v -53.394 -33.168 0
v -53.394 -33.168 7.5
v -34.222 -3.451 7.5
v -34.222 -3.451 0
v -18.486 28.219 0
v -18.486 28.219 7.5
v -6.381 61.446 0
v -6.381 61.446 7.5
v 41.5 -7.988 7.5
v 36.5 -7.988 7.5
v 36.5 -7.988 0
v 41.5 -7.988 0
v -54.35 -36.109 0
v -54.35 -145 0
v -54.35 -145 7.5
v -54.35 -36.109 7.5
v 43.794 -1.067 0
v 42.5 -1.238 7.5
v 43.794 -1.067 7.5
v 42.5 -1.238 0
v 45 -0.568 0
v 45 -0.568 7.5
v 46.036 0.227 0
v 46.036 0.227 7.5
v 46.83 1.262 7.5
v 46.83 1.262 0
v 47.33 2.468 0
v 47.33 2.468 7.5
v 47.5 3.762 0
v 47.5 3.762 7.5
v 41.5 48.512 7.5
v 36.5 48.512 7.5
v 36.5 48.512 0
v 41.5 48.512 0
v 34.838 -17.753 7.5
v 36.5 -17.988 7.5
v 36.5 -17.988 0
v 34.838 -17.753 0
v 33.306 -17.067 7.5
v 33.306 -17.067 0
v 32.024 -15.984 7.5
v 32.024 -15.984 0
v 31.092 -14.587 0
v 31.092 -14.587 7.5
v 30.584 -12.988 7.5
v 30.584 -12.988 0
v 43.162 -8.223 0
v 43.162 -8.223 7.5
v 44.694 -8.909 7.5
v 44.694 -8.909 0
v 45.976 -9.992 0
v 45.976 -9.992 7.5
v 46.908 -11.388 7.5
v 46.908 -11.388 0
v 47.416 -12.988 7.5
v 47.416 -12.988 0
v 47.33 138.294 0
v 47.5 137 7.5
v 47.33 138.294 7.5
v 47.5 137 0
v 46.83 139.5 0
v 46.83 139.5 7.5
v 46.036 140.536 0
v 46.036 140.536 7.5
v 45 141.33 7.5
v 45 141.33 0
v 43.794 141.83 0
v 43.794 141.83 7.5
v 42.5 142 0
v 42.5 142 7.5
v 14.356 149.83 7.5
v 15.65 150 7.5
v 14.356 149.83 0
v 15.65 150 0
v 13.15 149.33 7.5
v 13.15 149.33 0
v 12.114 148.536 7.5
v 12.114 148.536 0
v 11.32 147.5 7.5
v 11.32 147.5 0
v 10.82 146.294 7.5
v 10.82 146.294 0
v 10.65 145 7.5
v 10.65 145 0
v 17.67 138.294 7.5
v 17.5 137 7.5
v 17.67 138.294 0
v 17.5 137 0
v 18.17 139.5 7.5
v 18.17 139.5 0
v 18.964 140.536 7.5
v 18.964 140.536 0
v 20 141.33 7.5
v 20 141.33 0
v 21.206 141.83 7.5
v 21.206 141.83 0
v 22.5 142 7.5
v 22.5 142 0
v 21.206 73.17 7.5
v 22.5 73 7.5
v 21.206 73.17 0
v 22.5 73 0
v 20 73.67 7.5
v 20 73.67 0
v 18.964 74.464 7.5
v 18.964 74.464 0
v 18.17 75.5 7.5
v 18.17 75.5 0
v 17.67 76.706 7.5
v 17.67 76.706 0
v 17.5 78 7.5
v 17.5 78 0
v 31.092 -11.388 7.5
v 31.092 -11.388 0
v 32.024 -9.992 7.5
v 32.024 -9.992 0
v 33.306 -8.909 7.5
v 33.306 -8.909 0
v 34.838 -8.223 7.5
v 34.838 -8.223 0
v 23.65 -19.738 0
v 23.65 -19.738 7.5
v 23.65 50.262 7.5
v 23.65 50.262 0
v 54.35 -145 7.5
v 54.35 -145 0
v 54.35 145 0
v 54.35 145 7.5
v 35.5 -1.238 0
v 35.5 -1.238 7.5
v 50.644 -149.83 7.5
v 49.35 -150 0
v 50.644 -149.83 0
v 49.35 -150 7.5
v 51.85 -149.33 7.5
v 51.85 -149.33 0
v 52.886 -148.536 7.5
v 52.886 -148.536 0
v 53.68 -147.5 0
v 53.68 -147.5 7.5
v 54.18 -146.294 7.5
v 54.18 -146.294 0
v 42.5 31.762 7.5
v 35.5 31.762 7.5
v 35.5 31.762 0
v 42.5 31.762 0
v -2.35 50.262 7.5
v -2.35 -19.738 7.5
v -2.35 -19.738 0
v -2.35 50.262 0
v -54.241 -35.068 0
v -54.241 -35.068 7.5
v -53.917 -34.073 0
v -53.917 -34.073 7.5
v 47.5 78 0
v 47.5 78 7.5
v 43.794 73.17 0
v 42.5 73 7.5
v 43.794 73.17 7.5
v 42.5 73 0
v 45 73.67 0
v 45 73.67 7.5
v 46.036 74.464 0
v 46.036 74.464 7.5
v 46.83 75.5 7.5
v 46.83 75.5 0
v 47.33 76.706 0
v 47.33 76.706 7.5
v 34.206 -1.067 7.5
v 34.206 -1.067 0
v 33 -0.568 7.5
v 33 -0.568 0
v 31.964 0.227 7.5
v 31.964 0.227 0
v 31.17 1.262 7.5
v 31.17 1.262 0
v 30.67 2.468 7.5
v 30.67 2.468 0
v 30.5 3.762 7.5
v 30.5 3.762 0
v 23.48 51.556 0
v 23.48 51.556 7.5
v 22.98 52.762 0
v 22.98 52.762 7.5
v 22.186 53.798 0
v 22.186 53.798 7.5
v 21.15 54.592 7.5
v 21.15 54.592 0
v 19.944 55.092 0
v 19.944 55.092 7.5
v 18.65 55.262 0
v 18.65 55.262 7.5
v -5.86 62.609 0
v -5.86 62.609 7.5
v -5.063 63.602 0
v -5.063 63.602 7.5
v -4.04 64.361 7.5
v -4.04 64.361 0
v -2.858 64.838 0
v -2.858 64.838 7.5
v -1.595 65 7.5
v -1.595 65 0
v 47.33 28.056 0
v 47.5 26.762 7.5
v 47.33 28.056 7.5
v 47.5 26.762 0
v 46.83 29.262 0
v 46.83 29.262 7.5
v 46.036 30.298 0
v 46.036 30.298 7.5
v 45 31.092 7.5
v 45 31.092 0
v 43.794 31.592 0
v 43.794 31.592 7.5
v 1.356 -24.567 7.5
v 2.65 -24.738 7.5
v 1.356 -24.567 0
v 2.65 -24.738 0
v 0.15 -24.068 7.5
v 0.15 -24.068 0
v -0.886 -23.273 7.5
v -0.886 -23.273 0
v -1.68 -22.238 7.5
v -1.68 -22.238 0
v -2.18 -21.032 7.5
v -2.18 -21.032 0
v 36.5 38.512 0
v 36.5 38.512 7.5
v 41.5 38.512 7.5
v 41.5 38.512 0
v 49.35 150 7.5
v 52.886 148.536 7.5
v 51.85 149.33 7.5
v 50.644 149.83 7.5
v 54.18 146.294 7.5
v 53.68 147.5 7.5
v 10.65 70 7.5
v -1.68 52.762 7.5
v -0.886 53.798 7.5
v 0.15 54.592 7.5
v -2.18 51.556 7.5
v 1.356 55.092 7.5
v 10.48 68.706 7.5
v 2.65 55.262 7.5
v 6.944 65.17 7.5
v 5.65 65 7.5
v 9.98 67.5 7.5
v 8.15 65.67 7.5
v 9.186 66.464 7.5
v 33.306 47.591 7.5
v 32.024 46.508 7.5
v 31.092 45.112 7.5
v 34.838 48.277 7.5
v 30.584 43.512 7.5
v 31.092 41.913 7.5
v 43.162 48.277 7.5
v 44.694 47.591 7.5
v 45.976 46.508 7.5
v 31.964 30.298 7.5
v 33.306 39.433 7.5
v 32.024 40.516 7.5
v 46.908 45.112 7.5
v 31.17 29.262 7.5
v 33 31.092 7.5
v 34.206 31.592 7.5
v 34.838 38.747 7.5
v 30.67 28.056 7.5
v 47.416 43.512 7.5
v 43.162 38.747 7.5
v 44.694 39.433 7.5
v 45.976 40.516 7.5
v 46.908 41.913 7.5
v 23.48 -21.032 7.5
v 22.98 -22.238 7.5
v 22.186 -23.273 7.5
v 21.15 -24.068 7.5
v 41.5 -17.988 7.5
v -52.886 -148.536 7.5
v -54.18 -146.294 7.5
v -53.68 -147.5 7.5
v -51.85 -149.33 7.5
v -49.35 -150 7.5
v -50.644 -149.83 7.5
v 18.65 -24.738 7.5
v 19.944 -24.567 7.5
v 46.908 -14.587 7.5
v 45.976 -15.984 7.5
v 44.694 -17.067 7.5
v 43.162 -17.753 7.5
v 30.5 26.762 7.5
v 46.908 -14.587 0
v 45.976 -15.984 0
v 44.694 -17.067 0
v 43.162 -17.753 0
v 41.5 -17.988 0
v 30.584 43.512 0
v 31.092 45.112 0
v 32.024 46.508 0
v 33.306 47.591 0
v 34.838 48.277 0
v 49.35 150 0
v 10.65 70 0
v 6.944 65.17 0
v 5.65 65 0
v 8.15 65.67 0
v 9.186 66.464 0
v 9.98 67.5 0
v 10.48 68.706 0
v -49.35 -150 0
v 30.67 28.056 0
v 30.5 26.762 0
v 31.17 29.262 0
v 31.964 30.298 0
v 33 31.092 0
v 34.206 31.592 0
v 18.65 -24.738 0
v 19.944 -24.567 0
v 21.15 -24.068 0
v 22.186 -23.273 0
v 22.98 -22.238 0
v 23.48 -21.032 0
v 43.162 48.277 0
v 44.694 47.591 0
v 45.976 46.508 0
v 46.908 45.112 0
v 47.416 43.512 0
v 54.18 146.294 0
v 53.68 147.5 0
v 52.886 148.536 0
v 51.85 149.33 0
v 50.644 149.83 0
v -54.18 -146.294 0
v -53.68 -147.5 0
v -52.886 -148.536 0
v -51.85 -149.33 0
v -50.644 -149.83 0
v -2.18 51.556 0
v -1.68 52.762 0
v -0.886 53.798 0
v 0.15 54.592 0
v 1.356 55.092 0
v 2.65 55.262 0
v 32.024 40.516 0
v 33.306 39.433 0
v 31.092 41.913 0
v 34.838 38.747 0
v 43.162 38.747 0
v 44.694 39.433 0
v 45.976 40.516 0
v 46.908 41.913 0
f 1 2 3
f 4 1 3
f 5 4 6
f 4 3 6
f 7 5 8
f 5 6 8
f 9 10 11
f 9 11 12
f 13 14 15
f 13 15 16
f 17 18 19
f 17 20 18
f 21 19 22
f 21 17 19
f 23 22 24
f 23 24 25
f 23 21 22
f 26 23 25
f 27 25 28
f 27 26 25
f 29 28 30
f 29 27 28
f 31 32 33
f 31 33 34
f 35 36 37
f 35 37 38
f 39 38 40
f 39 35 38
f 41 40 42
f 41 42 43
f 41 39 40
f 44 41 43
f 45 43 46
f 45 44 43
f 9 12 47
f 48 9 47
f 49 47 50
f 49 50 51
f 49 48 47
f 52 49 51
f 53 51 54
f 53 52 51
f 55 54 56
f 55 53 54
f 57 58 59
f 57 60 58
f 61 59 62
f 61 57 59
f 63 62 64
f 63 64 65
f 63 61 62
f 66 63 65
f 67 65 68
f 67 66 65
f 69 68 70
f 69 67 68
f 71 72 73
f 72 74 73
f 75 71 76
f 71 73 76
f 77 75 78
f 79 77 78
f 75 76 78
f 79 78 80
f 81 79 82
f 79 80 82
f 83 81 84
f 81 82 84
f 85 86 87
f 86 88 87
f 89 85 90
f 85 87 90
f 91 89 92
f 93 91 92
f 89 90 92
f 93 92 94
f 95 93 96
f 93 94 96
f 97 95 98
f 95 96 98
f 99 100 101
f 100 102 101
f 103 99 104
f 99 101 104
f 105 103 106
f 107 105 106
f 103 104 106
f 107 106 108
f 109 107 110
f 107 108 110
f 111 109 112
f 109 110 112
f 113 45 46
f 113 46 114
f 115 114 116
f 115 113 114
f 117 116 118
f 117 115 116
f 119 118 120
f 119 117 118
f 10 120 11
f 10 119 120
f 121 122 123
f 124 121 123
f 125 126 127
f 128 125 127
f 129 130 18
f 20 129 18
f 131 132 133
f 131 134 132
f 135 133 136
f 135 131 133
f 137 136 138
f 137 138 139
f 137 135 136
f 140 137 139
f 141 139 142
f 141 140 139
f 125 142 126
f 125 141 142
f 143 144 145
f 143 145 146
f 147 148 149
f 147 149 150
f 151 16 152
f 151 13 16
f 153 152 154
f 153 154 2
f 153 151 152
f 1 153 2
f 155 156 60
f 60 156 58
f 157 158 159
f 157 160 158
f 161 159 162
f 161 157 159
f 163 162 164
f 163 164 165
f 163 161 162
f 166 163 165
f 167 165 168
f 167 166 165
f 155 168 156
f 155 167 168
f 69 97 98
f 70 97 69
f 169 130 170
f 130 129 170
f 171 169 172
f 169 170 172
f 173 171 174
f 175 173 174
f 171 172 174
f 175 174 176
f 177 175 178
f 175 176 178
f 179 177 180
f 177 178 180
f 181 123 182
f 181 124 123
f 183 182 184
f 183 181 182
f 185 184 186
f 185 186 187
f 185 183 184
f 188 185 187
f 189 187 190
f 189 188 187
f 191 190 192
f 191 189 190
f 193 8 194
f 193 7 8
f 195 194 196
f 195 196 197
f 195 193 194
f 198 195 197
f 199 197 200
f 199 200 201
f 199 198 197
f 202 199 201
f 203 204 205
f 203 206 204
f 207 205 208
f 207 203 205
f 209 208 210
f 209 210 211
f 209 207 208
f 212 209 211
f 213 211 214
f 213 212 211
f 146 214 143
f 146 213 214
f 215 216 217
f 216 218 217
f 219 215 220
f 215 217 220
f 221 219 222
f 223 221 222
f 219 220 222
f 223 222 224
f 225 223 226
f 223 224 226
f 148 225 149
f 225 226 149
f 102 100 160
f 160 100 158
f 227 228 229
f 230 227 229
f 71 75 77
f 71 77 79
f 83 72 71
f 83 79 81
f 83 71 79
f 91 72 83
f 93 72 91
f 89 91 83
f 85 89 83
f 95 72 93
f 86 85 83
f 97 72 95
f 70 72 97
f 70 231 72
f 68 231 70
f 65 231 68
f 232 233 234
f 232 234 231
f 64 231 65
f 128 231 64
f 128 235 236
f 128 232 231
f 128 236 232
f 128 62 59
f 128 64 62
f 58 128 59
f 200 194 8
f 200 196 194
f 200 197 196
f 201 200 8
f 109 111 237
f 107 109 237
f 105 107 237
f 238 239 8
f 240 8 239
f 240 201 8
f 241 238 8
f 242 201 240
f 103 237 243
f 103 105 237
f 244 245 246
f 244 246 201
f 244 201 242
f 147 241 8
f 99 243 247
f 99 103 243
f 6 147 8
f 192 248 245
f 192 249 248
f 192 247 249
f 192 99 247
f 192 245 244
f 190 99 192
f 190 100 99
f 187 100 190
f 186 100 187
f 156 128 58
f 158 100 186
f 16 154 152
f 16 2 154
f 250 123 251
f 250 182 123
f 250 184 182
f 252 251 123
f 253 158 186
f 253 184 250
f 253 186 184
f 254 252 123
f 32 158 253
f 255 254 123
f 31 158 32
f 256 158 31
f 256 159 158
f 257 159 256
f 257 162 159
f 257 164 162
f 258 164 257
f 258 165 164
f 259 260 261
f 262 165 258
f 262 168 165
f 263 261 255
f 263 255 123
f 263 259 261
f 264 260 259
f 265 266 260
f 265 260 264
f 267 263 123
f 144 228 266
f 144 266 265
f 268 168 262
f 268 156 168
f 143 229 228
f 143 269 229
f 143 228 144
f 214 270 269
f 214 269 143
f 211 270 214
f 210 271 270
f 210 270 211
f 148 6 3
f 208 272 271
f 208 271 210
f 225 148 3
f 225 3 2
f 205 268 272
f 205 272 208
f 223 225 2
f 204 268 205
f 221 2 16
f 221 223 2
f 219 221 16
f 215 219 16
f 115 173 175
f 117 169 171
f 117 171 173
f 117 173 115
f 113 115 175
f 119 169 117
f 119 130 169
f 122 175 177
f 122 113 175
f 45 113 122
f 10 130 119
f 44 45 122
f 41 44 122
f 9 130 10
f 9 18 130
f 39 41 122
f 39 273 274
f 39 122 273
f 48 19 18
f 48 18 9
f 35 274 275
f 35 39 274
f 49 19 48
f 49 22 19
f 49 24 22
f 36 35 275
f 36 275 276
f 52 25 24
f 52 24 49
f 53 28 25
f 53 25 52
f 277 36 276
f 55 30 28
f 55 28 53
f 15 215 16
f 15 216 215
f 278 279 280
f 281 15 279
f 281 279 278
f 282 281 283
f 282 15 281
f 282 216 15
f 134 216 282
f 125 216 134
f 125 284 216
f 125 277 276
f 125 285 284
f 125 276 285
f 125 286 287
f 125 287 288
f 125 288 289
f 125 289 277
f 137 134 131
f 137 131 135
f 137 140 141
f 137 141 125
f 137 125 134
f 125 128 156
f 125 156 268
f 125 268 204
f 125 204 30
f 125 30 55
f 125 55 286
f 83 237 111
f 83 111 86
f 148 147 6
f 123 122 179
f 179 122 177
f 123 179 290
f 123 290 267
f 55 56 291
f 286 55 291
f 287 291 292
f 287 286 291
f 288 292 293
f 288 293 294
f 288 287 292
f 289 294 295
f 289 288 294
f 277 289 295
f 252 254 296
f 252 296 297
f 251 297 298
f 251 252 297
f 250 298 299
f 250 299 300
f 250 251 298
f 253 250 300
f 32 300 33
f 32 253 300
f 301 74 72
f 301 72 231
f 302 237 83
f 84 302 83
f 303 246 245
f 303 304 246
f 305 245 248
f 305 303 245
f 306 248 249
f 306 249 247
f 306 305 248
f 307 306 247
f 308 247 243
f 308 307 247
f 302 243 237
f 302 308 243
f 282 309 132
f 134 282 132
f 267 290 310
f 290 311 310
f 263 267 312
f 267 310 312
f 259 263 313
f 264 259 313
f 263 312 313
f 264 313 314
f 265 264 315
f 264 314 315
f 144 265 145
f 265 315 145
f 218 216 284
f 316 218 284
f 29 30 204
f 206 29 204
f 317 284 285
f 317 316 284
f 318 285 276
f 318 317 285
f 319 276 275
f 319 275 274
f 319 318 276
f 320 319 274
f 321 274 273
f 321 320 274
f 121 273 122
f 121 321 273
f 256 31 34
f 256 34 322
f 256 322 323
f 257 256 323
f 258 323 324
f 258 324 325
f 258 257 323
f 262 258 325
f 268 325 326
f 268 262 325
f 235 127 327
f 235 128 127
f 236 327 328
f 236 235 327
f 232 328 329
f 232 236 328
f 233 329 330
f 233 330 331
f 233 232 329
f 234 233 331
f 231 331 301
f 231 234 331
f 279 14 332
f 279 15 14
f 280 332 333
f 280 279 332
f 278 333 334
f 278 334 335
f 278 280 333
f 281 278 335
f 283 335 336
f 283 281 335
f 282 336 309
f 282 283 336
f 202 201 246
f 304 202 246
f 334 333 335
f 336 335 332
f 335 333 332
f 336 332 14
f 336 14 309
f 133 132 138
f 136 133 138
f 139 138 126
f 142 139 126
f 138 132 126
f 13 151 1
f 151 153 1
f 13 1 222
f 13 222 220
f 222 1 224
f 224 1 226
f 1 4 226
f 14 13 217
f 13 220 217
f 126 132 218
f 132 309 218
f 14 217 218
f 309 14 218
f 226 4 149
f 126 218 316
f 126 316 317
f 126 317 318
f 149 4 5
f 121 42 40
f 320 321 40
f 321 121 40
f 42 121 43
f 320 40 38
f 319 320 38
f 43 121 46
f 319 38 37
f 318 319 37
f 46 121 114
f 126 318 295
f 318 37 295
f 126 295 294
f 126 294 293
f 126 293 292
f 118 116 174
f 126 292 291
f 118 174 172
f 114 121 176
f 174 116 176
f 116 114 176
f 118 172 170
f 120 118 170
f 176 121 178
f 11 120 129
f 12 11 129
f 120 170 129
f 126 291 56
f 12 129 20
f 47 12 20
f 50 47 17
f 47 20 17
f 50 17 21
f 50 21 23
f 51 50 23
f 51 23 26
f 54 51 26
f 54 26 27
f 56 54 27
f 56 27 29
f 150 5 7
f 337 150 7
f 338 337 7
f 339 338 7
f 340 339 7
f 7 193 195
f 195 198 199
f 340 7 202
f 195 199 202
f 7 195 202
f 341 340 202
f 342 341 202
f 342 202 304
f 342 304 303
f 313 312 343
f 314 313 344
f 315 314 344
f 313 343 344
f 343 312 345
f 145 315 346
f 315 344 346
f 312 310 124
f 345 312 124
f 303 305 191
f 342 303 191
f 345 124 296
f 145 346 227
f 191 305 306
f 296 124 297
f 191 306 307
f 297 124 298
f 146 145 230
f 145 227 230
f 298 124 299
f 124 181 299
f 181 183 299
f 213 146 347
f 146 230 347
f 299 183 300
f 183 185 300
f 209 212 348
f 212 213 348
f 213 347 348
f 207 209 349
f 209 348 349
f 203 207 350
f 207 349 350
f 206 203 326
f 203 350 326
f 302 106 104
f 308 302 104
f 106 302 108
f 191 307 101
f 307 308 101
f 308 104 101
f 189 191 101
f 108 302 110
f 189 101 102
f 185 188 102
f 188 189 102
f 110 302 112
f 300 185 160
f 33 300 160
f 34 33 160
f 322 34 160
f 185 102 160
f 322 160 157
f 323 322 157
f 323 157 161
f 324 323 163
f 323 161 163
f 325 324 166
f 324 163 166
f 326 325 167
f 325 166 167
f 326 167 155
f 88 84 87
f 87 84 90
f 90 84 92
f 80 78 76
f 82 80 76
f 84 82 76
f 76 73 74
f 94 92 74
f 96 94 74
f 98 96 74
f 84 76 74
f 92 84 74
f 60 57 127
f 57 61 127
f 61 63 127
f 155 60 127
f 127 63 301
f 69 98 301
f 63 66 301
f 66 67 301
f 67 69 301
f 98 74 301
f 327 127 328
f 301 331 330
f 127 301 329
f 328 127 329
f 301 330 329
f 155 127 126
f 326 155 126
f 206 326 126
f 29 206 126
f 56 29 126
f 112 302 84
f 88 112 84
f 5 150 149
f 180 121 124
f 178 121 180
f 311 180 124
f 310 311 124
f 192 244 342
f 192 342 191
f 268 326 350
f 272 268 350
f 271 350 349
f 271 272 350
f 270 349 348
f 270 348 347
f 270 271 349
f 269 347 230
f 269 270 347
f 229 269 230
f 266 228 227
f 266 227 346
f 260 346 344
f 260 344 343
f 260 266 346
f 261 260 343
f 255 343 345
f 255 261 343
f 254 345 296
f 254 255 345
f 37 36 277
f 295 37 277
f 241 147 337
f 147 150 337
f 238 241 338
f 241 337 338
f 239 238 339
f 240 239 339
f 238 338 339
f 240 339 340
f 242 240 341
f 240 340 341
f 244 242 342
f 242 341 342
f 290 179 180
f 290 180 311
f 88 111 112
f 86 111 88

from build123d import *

# Parameters (mm, degrees)
SKETCH1_W           = 108.7
SKETCH1_H           = 300
BOSS_EXTRUDE1_DEPTH = 7.5
SKETCH2_W           = 65
SKETCH2_H           = 85
CUT_EXTRUDE1_DEPTH  = 7.5
CUT_EXTRUDE2_DEPTH  = 7.5
SKETCH5_W           = 30
SKETCH5_H           = 69
CUT_EXTRUDE3_DEPTH  = 7.5
SKETCH6_W           = 26
SKETCH6_H           = 80
CUT_EXTRUDE4_DEPTH  = 7.5
SKETCH9_W           = 17
SKETCH9_H           = 33
CUT_EXTRUDE5_DEPTH  = 7.5
SKETCH10_W          = 17
SKETCH10_H          = 10
CUT_EXTRUDE6_DEPTH  = 7.5
FILLET3_R           = 5
FILLET4_R           = 6


with BuildPart() as part:
    # Sketch1 → Boss-Extrude1 (new body)
    with BuildSketch(Plane.XY):
        Rectangle(SKETCH1_W, SKETCH1_H)
    extrude(amount=BOSS_EXTRUDE1_DEPTH)

    # Sketch2 → Cut-Extrude1 (cut)
    with BuildSketch(Plane.XY.offset(7.5)):
        with Locations((-21.85, 107.5)):
            Rectangle(SKETCH2_W, SKETCH2_H)
    extrude(amount=-CUT_EXTRUDE1_DEPTH, mode=Mode.SUBTRACT)

    # Sketch4 → Cut-Extrude2 (cut)
    with BuildSketch(Plane.XY.offset(7.5)):
        with BuildLine():
            Line((-54.35, 65), (-54.35, -34.475529761))
            ThreePointArc((-54.35, -34.475529761), (-25.449157059, 13.098498105), (-5.32998831, 65))
            Line((-5.32998831, 65), (-54.35, 65))
        make_face()
    extrude(amount=-CUT_EXTRUDE2_DEPTH, mode=Mode.SUBTRACT)

    # Sketch5 → Cut-Extrude3 (cut)
    with BuildSketch(Plane.XY.offset(7.5)):
        with Locations((32.5, 107.5)):
            Rectangle(SKETCH5_W, SKETCH5_H)
    extrude(amount=-CUT_EXTRUDE3_DEPTH, mode=Mode.SUBTRACT)

    # Sketch6 → Cut-Extrude4 (cut)
    with BuildSketch(Plane.XY.offset(7.5)):
        with Locations((10.65, 15.262235119)):
            Rectangle(SKETCH6_W, SKETCH6_H)
    extrude(amount=-CUT_EXTRUDE4_DEPTH, mode=Mode.SUBTRACT)

    # Sketch9 → Cut-Extrude5 (cut)
    with BuildSketch(Plane.XY.offset(7.5)):
        with Locations((39, 15.262235119)):
            Rectangle(SKETCH9_W, SKETCH9_H)
    extrude(amount=-CUT_EXTRUDE5_DEPTH, mode=Mode.SUBTRACT)

    # Sketch10 → Cut-Extrude6 (cut)
    with BuildSketch(Plane.XY.offset(7.5)):
        with Locations((39, 43.512235119)):
            Rectangle(SKETCH10_W, SKETCH10_H)
        with Locations((39, -12.987764881)):
            Rectangle(SKETCH10_W, SKETCH10_H)
    extrude(amount=-CUT_EXTRUDE6_DEPTH, mode=Mode.SUBTRACT)

    # Fillet3
    fillet3_edges = [part.edges().sort_by_distance(p)[0] for p in [
        (10.65, 150, 3.75),
        (10.65, 65, 3.75),
        (-5.32998831, 65, 3.75),
        (-54.35, -34.475529761, 3.75),
        (47.5, 142, 3.75),
        (47.5, 73, 3.75),
        (17.5, 73, 3.75),
        (17.5, 142, 3.75),
        (23.65, 55.262235119, 3.75),
        (23.65, -24.737764881, 3.75),
        (-2.35, -24.737764881, 3.75),
        (-2.35, 55.262235119, 3.75),
        (54.35, -150, 3.75),
        (-54.35, -150, 3.75),
        (47.5, 31.762235119, 3.75),
        (47.5, -1.237764881, 3.75),
        (30.5, -1.237764881, 3.75),
        (30.5, 31.762235119, 3.75),
        (54.35, 150, 3.75),
    ]]
    fillet(fillet3_edges, radius=FILLET3_R)

    # Fillet4
    # the kernel refuses this fillet: 6 mm, written as the material it adds along each edge
    with BuildSketch(Plane(origin=(47.5, -17.987764881, 7.5), x_dir=(0, 1, 0), z_dir=(0, 0, -1)), Plane(origin=(47.5, -7.987764881, 7.5), x_dir=(-1, 0, 0), z_dir=(0, 0, -1)), Plane(origin=(30.5, -17.987764881, 7.5), x_dir=(1, 0, 0), z_dir=(0, 0, -1)), Plane(origin=(47.5, 38.512235119, 7.5), x_dir=(0, 1, 0), z_dir=(0, 0, -1)), Plane(origin=(30.5, 38.512235119, 7.5), x_dir=(1, 0, 0), z_dir=(0, 0, -1)), Plane(origin=(47.5, 48.512235119, 7.5), x_dir=(-1, 0, 0), z_dir=(0, 0, -1))) as fillet4_piece_1:
        with BuildLine():
            CenterArc((FILLET4_R, -FILLET4_R), FILLET4_R, 90, 90)
            Line((0, -FILLET4_R), (0, 0))
            Line((0, 0), (FILLET4_R, 0))
        make_face()
    extrude(amount=7.5)
    with BuildSketch(Plane(origin=(30.5, -7.987764881, 7.5), x_dir=(1, 0, 0), z_dir=(0, 0, -1)), Plane(origin=(30.5, 48.512235119, 7.5), x_dir=(1, 0, 0), z_dir=(0, 0, -1))) as fillet4_piece_2:
        with BuildLine():
            CenterArc((FILLET4_R, FILLET4_R), FILLET4_R, 180, 90)
            Line((0, FILLET4_R), (0, 0))
            Line((0, 0), (FILLET4_R, 0))
        make_face()
    extrude(amount=7.5)


solid = part.part
